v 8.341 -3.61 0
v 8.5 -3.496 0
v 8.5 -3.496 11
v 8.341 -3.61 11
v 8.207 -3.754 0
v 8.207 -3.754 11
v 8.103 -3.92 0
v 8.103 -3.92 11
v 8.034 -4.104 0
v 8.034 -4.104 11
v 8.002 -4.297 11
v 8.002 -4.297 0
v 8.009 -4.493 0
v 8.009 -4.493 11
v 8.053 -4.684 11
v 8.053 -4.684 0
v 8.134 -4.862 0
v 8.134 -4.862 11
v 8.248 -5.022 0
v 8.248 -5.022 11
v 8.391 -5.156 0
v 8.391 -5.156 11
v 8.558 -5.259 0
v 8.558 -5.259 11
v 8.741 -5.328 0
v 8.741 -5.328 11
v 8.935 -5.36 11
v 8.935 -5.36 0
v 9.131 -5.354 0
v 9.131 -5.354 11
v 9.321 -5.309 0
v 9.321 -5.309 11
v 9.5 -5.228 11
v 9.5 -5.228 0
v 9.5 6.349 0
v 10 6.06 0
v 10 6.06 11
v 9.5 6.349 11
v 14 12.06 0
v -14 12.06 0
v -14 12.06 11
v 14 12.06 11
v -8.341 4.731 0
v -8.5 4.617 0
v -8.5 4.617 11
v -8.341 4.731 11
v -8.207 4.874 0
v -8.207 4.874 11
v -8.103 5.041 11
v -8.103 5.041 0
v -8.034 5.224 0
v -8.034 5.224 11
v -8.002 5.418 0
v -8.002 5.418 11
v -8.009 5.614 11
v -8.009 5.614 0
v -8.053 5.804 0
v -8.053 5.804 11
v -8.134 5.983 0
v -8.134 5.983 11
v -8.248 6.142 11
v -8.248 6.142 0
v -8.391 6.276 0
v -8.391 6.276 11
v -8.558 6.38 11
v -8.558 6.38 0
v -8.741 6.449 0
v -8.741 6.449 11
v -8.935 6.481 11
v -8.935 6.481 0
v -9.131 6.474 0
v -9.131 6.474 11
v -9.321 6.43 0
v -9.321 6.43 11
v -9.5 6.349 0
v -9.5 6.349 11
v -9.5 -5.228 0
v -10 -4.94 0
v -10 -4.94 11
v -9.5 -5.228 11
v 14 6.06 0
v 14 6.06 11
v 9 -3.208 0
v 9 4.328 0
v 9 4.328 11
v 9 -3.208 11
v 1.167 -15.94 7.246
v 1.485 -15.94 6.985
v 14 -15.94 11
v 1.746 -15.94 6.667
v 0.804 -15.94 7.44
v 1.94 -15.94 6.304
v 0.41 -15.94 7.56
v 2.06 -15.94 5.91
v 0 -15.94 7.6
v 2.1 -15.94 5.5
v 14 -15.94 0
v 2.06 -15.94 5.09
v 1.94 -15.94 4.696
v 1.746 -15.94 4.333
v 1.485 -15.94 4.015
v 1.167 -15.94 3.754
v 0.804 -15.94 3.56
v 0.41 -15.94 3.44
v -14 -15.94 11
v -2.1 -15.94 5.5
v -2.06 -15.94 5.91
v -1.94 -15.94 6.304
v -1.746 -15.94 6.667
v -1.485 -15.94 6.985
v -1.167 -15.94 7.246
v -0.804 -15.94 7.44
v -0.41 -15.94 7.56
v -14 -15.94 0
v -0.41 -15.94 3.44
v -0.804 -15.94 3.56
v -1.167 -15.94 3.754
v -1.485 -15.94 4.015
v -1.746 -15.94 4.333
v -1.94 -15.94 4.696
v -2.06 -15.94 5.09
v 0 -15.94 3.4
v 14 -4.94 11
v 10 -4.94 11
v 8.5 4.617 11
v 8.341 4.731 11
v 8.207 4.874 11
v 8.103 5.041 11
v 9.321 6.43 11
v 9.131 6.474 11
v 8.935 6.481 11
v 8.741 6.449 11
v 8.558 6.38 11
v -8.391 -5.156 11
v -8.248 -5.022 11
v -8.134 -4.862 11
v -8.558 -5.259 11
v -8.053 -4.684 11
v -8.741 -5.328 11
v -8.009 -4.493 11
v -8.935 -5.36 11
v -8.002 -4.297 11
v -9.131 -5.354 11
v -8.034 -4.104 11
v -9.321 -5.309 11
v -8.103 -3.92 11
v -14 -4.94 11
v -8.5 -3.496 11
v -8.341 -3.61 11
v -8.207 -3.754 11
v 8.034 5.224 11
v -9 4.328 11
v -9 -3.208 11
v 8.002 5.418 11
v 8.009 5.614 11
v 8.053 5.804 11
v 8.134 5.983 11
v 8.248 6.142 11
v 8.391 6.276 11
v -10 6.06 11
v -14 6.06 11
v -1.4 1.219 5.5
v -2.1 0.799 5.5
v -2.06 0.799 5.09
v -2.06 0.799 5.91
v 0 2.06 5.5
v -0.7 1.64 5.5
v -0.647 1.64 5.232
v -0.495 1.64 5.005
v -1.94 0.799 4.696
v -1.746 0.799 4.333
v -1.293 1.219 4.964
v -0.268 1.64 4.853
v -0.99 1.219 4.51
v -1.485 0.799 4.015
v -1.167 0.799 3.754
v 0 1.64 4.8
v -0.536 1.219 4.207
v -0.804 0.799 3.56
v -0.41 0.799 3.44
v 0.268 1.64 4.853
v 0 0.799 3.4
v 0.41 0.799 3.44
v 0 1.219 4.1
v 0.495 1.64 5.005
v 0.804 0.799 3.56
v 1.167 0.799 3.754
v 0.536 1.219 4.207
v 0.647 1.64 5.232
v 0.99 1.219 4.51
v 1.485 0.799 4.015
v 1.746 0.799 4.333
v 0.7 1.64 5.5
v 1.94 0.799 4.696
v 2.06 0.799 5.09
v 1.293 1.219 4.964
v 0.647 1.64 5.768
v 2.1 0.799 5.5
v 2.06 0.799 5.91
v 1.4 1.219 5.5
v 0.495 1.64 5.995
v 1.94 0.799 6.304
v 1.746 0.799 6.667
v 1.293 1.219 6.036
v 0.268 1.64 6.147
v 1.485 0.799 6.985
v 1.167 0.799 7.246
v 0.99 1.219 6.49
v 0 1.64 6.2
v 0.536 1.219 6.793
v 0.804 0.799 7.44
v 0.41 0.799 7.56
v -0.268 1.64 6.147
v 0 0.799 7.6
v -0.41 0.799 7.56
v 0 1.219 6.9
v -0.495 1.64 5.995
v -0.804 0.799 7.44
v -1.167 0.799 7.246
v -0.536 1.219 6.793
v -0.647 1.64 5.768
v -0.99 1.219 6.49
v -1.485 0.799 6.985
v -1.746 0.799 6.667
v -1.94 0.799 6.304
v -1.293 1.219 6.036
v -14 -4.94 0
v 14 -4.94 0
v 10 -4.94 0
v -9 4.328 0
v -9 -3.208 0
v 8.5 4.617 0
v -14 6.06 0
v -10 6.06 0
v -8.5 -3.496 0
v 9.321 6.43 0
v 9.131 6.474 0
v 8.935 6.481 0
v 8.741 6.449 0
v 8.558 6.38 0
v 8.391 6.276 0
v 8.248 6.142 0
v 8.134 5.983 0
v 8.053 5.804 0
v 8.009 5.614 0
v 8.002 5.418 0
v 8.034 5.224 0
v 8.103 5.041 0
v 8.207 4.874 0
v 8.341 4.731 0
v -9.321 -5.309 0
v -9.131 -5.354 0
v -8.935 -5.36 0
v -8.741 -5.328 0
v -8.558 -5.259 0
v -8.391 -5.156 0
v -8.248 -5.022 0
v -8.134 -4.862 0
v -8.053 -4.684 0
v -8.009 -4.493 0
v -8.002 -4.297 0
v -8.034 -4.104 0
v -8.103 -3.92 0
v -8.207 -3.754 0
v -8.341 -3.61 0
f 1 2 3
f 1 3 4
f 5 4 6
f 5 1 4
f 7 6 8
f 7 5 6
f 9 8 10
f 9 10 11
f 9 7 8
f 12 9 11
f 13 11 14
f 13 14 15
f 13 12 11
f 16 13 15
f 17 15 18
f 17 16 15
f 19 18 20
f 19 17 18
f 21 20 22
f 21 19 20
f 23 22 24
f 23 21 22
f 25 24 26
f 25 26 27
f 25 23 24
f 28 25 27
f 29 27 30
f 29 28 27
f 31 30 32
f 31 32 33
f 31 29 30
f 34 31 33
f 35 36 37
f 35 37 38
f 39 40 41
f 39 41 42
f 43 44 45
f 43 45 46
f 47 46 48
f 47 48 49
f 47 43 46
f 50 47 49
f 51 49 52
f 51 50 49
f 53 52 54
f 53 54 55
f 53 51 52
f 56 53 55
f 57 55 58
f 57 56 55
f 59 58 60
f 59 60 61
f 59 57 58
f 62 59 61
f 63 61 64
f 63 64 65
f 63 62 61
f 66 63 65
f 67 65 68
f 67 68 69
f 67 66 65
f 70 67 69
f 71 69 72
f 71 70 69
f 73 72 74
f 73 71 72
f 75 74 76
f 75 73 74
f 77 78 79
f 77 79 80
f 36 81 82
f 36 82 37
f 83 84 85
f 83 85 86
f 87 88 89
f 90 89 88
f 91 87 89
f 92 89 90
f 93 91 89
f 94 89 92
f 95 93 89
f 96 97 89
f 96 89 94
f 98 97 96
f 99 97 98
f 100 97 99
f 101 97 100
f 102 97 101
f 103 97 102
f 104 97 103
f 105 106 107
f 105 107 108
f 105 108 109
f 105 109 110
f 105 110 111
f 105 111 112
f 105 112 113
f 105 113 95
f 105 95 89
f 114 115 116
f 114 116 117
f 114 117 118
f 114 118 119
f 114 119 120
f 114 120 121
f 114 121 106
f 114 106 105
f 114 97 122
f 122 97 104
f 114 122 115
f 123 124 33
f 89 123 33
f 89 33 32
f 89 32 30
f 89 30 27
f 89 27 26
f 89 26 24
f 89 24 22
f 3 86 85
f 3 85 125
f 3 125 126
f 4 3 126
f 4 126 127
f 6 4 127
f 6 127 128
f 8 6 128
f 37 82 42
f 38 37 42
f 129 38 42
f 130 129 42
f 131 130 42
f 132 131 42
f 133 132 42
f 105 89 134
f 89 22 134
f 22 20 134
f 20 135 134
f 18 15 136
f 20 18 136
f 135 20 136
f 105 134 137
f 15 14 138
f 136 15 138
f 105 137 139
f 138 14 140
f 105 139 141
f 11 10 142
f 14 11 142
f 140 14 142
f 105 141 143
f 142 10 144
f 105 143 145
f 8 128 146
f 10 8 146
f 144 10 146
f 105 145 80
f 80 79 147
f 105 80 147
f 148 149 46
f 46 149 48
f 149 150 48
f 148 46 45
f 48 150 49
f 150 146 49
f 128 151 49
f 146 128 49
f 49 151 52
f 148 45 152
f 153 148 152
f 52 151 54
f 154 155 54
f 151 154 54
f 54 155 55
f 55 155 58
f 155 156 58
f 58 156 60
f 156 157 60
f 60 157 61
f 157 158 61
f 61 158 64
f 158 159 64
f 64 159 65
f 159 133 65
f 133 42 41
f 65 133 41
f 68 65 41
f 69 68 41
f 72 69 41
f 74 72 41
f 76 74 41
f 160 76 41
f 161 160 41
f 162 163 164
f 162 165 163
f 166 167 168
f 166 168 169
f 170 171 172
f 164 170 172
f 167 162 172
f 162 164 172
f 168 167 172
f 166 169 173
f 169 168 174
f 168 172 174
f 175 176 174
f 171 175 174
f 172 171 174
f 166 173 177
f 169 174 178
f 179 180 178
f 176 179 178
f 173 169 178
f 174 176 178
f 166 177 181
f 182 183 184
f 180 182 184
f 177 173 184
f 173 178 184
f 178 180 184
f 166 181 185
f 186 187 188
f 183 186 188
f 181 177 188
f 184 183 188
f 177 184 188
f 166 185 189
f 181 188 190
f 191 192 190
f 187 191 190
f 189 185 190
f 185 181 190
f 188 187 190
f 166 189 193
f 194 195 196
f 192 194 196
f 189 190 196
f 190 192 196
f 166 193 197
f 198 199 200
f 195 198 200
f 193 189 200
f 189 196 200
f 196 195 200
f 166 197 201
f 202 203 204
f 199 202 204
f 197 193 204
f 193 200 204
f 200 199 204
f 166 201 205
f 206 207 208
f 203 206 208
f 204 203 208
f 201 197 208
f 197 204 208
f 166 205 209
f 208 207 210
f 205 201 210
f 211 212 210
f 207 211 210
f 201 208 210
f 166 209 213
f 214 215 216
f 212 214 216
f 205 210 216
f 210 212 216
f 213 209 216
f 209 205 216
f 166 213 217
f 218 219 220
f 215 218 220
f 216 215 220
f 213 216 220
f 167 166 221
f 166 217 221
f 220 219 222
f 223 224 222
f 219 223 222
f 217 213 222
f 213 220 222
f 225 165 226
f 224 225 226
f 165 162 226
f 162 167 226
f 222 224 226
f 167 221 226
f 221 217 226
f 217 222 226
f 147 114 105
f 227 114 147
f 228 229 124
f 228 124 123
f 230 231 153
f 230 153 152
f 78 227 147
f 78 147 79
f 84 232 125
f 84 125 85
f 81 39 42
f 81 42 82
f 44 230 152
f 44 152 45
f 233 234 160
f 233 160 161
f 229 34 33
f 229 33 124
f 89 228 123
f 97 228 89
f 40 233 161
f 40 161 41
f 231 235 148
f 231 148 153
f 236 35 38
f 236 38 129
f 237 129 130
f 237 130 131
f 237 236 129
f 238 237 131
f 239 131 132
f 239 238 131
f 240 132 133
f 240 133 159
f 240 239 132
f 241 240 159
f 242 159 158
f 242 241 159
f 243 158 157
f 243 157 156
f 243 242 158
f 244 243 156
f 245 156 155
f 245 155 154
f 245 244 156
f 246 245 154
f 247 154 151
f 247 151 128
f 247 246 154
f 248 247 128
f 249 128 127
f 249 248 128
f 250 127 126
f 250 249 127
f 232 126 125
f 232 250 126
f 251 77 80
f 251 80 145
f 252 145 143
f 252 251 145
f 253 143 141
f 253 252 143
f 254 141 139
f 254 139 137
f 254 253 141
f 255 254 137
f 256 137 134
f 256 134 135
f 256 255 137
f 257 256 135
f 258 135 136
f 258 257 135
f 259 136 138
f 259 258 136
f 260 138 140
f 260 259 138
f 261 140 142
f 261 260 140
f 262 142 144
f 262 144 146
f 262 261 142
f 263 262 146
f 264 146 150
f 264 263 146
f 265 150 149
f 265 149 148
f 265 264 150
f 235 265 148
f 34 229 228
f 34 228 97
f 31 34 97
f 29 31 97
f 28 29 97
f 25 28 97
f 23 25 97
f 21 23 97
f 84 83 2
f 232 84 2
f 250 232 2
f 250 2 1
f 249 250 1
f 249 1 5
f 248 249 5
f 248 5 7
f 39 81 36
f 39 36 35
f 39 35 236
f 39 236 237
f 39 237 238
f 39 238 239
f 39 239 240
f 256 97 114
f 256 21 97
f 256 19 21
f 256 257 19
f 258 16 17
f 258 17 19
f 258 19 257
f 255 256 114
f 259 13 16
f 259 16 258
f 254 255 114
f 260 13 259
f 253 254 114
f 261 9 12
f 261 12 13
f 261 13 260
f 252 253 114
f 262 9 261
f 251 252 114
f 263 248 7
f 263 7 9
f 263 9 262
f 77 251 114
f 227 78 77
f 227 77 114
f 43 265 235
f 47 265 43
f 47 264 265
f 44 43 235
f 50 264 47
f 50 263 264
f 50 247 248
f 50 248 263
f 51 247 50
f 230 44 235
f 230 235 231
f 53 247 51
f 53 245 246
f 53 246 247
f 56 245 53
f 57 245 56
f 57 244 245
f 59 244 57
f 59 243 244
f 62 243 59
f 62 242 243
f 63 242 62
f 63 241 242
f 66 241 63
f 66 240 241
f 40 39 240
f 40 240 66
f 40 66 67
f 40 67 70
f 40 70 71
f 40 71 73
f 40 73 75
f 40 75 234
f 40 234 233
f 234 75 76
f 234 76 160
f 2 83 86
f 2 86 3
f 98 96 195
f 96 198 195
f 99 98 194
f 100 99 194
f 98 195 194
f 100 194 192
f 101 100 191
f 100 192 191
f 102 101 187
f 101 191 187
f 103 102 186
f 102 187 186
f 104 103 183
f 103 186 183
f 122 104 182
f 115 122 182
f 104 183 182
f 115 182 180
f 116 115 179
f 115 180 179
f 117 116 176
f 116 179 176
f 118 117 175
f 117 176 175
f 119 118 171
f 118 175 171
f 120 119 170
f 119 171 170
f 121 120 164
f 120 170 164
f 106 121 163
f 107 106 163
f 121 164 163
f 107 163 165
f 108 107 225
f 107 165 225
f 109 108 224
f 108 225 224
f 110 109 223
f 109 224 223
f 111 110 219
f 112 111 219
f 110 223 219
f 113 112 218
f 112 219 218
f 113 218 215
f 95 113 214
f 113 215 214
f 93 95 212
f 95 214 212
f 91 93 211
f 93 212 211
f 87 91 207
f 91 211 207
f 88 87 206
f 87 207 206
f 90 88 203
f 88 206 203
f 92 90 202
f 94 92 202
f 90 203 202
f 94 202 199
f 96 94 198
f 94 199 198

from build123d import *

# Parameters (mm, degrees)
BOSS_EXTRUDE1_DEPTH   = 11
M5_TAPPED_HOLE1_D     = 4.2
M5_TAPPED_HOLE1_DEPTH = 16.7381927
M5_TAPPED_HOLE1_TIP   = 1.2618073


with BuildPart() as part:
    # Sketch1 → Boss-Extrude1 (new body)
    with BuildSketch(Plane.XY):
        with BuildLine():
            Line((14, -15.93967455), (-14, -15.93967455))
            Line((-14, -15.93967455), (-14, -4.93967455))
            Line((-14, -4.93967455), (-10, -4.93967455))
            Line((-10, -4.93967455), (-9.5, -5.228349685))
            ThreePointArc((-9.5, -5.228349685), (-8.133974596, -4.862324281), (-8.5, -3.496298877))
            Line((-8.5, -3.496298877), (-9, -3.207623743))
            Line((-9, -3.207623743), (-9, 4.328274642))
            Line((-9, 4.328274642), (-8.5, 4.616949777))
            ThreePointArc((-8.5, 4.616949777), (-8.133974596, 5.982975181), (-9.5, 6.349000584))
            Line((-9.5, 6.349000584), (-10, 6.06032545))
            Line((-10, 6.06032545), (-14, 6.06032545))
            Line((-14, 6.06032545), (-14, 12.06032545))
            Line((-14, 12.06032545), (14, 12.06032545))
            Line((14, 12.06032545), (14, 6.06032545))
            Line((14, 6.06032545), (10, 6.06032545))
            Line((10, 6.06032545), (9.5, 6.349000584))
            ThreePointArc((9.5, 6.349000584), (8.133974596, 5.982975181), (8.5, 4.616949777))
            Line((8.5, 4.616949777), (9, 4.328274642))
            Line((9, 4.328274642), (9, -3.207623743))
            Line((9, -3.207623743), (8.5, -3.496298877))
            ThreePointArc((8.5, -3.496298877), (8.133974596, -4.862324281), (9.5, -5.228349685))
            Line((9.5, -5.228349685), (10, -4.93967455))
            Line((10, -4.93967455), (14, -4.93967455))
            Line((14, -4.93967455), (14, -15.93967455))
        make_face()
    extrude(amount=BOSS_EXTRUDE1_DEPTH)

    # M5 Tapped Hole1
    with Locations(Plane(origin=(0, -15.93967455, 0), x_dir=(-1, 0, 0), z_dir=(0, -1, 0))):
        with Locations((0, -5.5)):
            Hole(M5_TAPPED_HOLE1_D / 2, depth=M5_TAPPED_HOLE1_DEPTH)
            with Locations((0, 0, -(M5_TAPPED_HOLE1_DEPTH + M5_TAPPED_HOLE1_TIP / 2))):  # 118° drill point
                Cone(0, M5_TAPPED_HOLE1_D / 2, M5_TAPPED_HOLE1_TIP, mode=Mode.SUBTRACT)


solid = part.part
